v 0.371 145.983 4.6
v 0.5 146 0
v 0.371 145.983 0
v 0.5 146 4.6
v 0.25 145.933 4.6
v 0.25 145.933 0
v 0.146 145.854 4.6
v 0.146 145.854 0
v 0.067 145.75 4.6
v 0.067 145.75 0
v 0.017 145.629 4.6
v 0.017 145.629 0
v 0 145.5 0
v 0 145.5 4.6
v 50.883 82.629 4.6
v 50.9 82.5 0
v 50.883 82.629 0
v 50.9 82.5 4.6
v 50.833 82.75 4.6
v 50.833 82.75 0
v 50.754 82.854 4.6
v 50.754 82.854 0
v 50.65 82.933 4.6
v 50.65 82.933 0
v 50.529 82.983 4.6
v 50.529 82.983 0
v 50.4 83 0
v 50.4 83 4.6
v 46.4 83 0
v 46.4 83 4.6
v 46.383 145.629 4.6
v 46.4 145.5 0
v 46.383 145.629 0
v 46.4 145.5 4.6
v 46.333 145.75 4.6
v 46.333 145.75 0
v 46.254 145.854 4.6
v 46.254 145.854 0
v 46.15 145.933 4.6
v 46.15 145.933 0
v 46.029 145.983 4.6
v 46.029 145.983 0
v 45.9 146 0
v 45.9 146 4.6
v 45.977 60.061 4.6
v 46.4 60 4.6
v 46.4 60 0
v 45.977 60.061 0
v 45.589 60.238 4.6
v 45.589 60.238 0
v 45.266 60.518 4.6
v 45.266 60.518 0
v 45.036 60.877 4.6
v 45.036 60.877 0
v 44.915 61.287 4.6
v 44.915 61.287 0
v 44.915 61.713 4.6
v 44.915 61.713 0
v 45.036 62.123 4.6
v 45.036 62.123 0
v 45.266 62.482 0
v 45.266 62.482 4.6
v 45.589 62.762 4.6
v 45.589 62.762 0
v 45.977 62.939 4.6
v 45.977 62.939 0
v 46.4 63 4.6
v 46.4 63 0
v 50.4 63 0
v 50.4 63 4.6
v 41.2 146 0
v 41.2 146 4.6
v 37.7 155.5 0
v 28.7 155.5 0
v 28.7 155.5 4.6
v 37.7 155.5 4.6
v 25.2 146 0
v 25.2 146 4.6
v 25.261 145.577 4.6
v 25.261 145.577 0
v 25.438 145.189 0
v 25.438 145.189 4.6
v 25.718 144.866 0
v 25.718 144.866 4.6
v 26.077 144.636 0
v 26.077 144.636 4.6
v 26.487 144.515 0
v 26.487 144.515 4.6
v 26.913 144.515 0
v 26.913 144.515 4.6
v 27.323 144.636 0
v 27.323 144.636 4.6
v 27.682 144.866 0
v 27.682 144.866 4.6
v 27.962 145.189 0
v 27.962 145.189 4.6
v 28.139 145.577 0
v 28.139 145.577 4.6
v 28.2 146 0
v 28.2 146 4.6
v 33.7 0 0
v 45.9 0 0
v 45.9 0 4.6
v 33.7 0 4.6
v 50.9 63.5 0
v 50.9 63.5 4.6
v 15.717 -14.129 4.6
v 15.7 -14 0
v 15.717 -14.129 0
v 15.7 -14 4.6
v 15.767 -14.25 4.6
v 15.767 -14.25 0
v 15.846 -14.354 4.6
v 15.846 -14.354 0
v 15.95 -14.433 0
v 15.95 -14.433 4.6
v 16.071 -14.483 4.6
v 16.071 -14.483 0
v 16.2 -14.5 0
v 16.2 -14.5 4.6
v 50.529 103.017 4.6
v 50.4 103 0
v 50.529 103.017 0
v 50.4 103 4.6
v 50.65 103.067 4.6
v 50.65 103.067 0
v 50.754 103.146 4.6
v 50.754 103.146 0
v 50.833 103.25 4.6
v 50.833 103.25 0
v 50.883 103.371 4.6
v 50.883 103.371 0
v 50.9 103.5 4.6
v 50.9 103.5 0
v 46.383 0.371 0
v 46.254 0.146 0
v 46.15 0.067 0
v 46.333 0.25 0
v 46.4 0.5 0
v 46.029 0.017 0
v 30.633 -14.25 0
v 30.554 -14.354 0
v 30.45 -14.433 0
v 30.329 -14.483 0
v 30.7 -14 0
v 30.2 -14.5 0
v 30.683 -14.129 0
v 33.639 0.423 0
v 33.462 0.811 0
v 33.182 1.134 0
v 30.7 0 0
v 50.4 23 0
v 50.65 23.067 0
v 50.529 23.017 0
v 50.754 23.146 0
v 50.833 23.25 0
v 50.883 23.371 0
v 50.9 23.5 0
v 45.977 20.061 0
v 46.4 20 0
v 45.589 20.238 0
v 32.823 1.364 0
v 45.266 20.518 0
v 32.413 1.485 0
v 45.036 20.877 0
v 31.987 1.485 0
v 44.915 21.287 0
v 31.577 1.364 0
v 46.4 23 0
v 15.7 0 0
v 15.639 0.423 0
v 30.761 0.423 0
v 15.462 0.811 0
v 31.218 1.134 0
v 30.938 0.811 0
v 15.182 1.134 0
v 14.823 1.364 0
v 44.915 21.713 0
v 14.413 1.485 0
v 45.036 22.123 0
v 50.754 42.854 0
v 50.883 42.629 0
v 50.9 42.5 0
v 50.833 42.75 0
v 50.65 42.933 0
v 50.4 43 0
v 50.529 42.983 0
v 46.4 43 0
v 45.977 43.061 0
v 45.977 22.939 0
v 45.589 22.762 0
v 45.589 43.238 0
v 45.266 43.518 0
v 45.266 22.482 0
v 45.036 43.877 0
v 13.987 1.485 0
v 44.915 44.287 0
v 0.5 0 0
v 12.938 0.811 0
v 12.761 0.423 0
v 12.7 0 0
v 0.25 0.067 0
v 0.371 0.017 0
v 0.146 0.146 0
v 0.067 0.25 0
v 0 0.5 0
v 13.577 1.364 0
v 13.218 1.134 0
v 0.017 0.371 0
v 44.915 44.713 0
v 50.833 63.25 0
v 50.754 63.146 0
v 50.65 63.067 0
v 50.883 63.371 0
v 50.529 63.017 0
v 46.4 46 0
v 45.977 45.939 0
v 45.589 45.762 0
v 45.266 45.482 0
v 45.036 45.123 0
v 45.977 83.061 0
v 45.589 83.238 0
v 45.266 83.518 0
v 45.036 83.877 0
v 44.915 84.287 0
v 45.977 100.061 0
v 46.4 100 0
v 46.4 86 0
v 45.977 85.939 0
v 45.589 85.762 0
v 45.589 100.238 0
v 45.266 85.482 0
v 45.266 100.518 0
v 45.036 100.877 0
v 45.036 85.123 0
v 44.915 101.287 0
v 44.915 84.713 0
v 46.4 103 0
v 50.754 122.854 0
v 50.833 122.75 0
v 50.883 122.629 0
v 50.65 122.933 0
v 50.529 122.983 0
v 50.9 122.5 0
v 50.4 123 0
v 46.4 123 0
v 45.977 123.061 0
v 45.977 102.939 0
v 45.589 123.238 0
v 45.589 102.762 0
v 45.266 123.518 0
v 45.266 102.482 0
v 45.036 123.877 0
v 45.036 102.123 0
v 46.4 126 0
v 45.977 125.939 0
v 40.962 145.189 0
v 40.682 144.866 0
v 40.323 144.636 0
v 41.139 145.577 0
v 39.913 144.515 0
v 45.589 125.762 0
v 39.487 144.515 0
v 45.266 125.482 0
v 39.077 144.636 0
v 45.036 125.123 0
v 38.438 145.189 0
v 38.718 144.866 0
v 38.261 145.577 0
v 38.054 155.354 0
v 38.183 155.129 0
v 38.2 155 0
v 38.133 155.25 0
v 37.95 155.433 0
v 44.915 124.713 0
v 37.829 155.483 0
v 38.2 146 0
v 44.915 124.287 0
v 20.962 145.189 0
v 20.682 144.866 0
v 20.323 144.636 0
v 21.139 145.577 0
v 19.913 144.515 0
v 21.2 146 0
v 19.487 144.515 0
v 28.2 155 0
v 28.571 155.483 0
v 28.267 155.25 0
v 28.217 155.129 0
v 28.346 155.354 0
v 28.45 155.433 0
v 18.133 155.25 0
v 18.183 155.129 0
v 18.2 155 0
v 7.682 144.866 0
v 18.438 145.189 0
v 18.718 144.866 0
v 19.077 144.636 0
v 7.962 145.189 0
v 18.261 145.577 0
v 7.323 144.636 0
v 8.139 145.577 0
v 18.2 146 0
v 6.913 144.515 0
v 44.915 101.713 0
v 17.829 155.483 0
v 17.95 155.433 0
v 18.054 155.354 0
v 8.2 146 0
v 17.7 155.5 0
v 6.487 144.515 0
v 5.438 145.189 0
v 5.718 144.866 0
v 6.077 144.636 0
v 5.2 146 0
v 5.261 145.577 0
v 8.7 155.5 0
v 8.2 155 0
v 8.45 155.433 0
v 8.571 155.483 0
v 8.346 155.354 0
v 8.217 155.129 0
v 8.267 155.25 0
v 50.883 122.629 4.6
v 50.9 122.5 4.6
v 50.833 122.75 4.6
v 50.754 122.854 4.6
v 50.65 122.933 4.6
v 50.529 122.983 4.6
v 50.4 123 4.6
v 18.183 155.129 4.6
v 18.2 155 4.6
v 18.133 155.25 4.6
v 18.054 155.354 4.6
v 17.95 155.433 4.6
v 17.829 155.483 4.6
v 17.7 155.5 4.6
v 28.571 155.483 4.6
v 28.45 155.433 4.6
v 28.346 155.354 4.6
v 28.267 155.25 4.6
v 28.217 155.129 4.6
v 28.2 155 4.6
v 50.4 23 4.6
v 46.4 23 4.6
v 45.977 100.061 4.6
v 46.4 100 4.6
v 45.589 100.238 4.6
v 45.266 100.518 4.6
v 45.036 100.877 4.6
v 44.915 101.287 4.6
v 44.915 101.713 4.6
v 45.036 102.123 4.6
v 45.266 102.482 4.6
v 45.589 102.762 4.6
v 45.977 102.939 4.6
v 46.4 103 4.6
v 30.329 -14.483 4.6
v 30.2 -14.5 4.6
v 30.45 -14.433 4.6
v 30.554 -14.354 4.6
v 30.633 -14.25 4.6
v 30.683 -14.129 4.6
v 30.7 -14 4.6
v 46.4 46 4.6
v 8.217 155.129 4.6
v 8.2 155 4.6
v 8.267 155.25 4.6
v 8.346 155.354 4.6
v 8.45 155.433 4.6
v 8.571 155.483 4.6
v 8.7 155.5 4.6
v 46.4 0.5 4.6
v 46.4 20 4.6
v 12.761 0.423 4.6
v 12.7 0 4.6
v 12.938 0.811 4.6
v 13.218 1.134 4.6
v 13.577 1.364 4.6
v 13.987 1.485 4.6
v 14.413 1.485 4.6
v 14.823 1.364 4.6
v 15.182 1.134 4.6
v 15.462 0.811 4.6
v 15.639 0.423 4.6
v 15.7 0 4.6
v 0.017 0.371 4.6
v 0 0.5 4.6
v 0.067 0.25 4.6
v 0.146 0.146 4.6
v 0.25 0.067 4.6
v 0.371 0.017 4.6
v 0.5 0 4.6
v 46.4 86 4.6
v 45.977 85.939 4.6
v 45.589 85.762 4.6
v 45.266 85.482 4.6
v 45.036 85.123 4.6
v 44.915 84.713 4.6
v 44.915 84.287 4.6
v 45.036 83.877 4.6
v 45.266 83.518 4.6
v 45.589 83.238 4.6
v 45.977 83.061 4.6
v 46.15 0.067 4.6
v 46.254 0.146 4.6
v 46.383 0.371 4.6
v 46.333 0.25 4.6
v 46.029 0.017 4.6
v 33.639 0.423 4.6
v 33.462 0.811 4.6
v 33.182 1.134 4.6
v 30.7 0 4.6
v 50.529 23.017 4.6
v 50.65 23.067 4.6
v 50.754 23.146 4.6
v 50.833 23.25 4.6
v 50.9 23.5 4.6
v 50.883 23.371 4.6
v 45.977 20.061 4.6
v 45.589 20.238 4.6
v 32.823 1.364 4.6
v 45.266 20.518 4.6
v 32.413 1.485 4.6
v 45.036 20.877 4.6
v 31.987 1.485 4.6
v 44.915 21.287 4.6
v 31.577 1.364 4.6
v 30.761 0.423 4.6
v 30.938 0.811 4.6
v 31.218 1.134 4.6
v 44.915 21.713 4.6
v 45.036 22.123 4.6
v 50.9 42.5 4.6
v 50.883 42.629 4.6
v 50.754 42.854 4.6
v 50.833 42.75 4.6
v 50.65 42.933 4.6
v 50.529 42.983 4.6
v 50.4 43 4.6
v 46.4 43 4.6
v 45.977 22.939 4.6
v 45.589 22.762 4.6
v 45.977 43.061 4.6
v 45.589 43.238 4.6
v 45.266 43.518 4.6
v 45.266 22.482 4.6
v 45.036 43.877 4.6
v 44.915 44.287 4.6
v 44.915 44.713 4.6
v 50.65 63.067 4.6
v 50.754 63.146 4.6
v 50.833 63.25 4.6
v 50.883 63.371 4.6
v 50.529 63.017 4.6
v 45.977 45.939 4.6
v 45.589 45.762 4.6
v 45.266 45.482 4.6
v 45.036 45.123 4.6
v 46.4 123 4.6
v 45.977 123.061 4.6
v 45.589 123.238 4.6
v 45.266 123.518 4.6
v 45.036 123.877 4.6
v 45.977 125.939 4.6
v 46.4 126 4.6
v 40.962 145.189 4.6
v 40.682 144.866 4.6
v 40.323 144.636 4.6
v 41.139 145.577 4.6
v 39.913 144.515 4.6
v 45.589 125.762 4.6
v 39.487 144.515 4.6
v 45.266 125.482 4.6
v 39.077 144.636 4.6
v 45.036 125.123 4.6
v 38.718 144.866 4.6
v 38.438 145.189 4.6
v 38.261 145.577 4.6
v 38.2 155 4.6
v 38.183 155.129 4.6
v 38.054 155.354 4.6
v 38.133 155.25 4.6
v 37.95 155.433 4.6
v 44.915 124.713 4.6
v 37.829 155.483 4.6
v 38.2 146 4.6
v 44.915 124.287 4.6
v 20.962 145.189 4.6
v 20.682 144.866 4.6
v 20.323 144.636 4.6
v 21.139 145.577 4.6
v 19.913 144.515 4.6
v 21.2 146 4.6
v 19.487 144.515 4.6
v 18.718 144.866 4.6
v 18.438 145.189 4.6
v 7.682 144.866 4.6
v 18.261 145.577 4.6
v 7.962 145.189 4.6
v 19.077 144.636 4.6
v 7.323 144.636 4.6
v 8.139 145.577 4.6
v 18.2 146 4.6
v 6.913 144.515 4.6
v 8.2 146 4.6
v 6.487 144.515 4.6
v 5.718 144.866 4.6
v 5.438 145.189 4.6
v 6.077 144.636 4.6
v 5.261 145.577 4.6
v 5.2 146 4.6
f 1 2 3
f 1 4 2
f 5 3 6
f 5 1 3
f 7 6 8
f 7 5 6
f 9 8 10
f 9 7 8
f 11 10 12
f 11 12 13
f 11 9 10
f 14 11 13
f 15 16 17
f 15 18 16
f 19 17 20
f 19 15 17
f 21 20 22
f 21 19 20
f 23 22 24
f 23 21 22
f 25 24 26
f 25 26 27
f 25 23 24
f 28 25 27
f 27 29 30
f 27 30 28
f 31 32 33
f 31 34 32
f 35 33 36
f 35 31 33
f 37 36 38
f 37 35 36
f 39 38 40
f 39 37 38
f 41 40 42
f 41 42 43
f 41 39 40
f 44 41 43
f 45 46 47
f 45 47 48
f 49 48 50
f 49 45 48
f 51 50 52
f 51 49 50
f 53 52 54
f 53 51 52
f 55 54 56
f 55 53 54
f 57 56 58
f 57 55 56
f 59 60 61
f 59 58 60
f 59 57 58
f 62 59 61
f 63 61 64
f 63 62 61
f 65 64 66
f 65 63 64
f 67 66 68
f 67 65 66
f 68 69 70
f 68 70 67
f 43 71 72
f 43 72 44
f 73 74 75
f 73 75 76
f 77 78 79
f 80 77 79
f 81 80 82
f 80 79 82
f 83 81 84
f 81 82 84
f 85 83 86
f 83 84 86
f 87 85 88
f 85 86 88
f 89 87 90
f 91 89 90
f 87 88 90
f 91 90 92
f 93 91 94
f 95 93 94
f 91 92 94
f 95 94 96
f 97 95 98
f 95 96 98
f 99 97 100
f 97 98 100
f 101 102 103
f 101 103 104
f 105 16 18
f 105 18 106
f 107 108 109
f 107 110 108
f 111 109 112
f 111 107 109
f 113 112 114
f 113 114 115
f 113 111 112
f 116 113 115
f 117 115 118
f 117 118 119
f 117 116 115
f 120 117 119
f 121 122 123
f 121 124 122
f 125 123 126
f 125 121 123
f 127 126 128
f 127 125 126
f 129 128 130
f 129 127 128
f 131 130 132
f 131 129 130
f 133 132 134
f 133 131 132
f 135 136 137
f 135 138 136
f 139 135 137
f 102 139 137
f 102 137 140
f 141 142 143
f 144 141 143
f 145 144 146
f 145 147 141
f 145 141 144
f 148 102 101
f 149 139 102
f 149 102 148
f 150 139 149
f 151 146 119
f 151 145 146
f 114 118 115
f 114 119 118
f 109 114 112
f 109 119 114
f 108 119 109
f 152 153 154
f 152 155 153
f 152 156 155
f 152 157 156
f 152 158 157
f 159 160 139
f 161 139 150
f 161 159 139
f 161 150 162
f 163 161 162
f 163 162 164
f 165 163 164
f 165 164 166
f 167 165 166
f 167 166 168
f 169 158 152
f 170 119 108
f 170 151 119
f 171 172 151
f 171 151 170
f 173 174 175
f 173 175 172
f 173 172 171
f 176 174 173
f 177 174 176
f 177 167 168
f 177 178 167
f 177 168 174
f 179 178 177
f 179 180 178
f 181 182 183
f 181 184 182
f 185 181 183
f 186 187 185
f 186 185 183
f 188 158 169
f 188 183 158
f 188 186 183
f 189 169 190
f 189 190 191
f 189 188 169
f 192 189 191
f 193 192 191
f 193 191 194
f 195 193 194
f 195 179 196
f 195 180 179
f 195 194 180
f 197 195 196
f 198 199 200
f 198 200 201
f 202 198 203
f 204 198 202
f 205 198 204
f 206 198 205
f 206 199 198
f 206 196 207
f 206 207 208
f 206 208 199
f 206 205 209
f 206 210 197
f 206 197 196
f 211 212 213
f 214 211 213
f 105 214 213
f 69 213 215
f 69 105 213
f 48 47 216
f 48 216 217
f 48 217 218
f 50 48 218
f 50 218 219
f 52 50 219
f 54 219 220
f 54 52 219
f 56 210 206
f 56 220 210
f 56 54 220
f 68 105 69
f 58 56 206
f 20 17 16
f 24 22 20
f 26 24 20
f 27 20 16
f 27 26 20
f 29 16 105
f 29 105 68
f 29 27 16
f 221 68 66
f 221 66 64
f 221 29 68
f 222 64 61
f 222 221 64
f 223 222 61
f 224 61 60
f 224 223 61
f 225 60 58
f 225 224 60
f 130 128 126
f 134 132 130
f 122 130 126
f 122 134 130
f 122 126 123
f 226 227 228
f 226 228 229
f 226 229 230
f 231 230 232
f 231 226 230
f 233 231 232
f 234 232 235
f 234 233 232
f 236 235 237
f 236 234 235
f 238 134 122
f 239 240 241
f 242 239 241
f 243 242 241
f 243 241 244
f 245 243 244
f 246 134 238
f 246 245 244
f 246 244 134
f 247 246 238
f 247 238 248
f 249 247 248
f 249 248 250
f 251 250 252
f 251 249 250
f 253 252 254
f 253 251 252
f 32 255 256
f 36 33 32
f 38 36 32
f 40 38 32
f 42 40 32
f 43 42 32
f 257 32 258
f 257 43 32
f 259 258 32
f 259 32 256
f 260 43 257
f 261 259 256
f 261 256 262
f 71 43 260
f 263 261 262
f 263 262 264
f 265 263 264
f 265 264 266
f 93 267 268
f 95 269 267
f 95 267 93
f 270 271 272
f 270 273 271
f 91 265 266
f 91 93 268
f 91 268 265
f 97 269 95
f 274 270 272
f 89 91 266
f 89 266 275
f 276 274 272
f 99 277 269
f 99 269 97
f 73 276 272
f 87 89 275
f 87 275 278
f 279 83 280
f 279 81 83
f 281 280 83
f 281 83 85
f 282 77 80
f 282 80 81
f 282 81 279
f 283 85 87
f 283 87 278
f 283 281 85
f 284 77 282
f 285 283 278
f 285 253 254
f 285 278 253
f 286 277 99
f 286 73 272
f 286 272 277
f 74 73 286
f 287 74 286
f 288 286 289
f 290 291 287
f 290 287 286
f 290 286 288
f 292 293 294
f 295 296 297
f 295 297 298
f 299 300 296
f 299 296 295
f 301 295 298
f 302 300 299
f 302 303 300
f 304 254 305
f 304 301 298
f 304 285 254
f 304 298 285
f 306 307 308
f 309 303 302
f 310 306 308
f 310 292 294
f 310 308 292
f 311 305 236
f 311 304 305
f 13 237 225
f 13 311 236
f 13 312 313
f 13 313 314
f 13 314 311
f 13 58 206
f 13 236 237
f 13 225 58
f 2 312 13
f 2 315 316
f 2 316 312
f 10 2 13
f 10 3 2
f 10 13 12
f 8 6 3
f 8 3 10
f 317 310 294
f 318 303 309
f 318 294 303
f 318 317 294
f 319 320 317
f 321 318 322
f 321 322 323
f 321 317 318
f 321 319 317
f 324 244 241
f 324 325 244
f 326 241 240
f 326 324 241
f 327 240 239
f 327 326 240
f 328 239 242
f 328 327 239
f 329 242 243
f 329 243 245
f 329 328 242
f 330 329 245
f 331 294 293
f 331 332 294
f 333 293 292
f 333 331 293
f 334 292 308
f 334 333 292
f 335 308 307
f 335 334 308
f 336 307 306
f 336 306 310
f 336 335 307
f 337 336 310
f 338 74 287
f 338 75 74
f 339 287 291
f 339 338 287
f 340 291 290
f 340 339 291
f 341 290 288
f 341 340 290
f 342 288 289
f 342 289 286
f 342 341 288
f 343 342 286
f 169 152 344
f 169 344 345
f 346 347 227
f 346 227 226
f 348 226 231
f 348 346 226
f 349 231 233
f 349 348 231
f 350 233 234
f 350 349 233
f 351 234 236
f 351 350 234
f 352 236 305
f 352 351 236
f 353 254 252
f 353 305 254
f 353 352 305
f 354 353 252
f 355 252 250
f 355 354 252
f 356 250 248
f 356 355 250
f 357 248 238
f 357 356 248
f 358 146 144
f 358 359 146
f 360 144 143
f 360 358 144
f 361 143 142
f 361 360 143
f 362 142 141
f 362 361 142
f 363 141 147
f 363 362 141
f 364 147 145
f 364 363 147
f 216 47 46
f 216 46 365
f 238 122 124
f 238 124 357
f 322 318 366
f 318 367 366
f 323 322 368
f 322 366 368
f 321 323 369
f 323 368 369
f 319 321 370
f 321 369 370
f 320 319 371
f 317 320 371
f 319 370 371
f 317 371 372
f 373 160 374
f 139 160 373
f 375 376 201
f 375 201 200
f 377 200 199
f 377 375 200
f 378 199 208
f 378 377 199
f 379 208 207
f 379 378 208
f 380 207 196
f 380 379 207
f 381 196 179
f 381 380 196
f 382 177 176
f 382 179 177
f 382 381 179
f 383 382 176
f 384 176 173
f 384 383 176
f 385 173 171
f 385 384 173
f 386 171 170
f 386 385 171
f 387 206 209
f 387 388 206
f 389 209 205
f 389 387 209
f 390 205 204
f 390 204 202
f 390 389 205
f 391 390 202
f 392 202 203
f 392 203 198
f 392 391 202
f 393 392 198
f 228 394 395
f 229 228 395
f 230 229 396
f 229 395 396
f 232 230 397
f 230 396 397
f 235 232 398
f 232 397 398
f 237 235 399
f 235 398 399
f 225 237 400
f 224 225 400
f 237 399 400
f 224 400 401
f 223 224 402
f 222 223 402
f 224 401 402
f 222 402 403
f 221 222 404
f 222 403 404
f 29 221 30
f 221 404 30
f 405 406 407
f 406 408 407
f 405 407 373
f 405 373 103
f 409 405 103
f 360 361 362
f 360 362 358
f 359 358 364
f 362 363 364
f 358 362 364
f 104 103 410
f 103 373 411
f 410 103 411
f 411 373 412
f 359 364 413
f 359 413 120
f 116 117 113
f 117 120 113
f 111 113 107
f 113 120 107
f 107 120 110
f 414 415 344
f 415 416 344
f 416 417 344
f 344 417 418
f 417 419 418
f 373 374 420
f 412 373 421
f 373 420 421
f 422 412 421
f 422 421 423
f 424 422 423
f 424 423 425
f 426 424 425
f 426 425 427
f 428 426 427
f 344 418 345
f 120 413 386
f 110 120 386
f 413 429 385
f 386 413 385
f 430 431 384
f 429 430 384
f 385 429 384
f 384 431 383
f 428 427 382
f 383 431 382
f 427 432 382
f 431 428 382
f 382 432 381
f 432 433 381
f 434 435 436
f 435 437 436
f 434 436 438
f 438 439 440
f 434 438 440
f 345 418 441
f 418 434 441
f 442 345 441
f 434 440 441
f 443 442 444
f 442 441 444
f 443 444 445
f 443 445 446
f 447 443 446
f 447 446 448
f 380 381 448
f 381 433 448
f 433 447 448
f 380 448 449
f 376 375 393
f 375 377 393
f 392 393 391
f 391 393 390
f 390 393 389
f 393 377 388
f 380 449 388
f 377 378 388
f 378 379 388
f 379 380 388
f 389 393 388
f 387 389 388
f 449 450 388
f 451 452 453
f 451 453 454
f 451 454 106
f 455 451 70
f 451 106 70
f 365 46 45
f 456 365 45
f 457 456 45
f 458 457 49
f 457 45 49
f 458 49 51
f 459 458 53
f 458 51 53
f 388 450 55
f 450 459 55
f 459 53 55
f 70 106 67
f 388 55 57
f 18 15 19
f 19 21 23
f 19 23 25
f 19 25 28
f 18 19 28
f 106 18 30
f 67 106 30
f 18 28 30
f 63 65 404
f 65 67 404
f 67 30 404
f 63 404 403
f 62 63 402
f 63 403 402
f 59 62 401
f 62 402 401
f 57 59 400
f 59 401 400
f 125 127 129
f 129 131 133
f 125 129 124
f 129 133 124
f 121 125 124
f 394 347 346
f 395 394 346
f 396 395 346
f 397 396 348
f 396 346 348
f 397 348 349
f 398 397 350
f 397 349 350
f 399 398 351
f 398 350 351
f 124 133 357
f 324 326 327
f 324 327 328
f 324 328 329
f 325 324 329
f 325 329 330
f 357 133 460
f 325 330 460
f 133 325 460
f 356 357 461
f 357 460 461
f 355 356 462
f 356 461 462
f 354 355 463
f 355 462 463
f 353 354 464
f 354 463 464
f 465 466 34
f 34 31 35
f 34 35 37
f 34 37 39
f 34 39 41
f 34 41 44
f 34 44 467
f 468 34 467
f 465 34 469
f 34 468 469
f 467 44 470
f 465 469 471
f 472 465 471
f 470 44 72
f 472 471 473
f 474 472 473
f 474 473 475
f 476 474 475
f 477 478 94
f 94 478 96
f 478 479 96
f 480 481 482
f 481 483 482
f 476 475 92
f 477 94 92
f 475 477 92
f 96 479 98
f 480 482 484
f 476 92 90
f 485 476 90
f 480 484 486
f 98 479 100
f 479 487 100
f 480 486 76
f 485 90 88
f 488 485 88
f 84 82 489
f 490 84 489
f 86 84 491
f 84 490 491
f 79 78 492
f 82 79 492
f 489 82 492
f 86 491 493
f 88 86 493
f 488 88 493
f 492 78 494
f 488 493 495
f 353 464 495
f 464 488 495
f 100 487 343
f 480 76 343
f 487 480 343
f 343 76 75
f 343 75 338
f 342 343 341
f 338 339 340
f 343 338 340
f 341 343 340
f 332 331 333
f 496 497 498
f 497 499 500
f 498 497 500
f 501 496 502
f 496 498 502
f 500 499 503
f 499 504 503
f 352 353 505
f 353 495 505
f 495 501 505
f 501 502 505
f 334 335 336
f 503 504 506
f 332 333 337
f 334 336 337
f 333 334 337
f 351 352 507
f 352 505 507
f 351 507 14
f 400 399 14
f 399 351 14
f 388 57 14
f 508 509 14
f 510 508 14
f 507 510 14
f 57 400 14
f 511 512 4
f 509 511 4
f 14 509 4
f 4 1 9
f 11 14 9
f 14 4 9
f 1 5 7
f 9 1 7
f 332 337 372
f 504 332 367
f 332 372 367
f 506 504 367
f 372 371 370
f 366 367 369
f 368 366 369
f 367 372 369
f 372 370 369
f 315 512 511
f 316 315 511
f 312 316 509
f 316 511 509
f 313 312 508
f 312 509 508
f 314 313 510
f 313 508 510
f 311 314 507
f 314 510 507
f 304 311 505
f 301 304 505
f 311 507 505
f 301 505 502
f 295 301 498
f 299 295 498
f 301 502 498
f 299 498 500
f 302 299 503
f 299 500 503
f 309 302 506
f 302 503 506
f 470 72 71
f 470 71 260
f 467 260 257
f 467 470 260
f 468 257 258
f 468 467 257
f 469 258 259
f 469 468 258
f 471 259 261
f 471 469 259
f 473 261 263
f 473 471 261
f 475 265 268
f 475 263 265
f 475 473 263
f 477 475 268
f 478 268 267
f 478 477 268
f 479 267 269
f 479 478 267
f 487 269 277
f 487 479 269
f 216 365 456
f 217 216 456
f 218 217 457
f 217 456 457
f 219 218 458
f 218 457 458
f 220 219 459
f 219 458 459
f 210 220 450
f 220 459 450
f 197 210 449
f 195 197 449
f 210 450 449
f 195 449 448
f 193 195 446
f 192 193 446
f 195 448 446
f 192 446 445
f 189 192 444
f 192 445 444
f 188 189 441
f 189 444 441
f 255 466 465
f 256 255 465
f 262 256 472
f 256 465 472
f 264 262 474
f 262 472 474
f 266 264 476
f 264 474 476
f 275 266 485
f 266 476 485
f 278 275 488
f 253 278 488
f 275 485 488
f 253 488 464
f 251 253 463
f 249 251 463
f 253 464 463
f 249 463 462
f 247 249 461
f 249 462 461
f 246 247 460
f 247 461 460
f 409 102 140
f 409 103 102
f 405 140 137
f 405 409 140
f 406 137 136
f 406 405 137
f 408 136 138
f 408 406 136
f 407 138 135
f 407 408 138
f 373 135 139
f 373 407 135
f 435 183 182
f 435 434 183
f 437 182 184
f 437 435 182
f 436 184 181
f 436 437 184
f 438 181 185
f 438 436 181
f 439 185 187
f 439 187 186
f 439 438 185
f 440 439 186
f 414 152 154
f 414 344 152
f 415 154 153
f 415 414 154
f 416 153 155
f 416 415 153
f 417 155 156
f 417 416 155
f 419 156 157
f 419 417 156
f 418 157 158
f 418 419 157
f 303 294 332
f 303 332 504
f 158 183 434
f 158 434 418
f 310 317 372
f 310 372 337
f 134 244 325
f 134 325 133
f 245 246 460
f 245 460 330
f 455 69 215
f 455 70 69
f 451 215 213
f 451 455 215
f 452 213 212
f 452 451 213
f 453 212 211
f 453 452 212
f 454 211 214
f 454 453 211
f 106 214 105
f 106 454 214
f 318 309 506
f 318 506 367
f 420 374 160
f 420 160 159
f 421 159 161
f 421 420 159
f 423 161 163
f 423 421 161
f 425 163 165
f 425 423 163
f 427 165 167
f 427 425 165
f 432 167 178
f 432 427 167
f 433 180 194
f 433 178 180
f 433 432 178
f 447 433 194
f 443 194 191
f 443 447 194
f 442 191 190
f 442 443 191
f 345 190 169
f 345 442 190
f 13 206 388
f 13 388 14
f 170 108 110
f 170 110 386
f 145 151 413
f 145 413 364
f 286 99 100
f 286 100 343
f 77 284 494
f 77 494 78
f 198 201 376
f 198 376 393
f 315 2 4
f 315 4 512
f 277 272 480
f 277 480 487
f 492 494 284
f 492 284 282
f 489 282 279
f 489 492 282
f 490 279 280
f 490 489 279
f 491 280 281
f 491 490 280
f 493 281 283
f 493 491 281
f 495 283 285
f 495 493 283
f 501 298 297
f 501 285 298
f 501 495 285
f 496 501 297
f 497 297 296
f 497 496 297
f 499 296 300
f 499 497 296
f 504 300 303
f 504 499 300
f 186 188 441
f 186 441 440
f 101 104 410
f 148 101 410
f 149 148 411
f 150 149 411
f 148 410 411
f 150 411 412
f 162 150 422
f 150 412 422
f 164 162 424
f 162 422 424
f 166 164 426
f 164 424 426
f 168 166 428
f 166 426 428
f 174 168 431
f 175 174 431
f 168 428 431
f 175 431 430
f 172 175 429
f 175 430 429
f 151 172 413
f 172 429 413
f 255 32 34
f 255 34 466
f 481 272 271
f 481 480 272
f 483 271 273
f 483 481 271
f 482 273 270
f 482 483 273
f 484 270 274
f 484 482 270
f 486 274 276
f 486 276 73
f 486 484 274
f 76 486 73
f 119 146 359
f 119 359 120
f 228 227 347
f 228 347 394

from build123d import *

# Parameters (mm, degrees)
BOSS_EXTRUDE1_DEPTH = 4.6
CUT_EXTRUDE1_DEPTH  = 164.683291756
FILLET1_R           = 0.5


with BuildPart() as part:
    # Sketch1 → Boss-Extrude1 (new body)
    with BuildSketch(Plane.XY):
        Polygon((8.2, 146), (8.2, 155.5), (18.2, 155.5), (18.2, 146), (28.2, 146), (28.2, 155.5), (38.2, 155.5), (38.2, 146), (46.4, 146), (46.4, 123), (50.9, 123), (50.9, 103), (46.4, 103), (46.4, 83), (50.9, 83), (50.9, 63), (46.4, 63), (46.4, 43), (50.9, 43), (50.9, 23), (46.4, 23), (46.4, 0), (30.7, 0), (30.7, -14.5), (15.7, -14.5), (15.7, 0), (0, 0), (0, 146), align=None)
    extrude(amount=BOSS_EXTRUDE1_DEPTH)

    # Sketch2 → Cut-Extrude1 (cut, through all)
    with BuildSketch(Plane.XY.offset(4.6)):
        with BuildLine():
            Line((15.7, 0), (15.7, -5))
            ThreePointArc((15.7, -5), (14.2, -6.5), (12.7, -5))
            Line((12.7, -5), (12.7, 0))
            ThreePointArc((12.7, 0), (14.2, 1.5), (15.7, 0))
        make_face()
        with BuildLine():
            Line((30.7, 0), (30.7, -5))
            ThreePointArc((30.7, -5), (32.2, -6.5), (33.7, -5))
            Line((33.7, -5), (33.7, 0))
            ThreePointArc((33.7, 0), (32.2, 1.5), (30.7, 0))
        make_face()
        with BuildLine():
            Line((46.4, 23), (50.9, 23))
            ThreePointArc((50.9, 23), (52.4, 21.5), (50.9, 20))
            Line((50.9, 20), (46.4, 20))
            ThreePointArc((46.4, 20), (44.9, 21.5), (46.4, 23))
        make_face()
        with BuildLine():
            Line((46.4, 63), (50.9, 63))
            ThreePointArc((50.9, 63), (52.4, 61.5), (50.9, 60))
            Line((50.9, 60), (46.4, 60))
            ThreePointArc((46.4, 60), (44.9, 61.5), (46.4, 63))
        make_face()
        with BuildLine():
            Line((46.4, 103), (50.9, 103))
            ThreePointArc((50.9, 103), (52.4, 101.5), (50.9, 100))
            Line((50.9, 100), (46.4, 100))
            ThreePointArc((46.4, 100), (44.9, 101.5), (46.4, 103))
        make_face()
        with BuildLine():
            Line((46.4, 43), (50.9, 43))
            ThreePointArc((50.9, 43), (52.4, 44.5), (50.9, 46))
            Line((50.9, 46), (46.4, 46))
            ThreePointArc((46.4, 46), (44.9, 44.5), (46.4, 43))
        make_face()
        with BuildLine():
            Line((46.4, 83), (50.9, 83))
            ThreePointArc((50.9, 83), (52.4, 84.5), (50.9, 86))
            Line((50.9, 86), (46.4, 86))
            ThreePointArc((46.4, 86), (44.9, 84.5), (46.4, 83))
        make_face()
        with BuildLine():
            Line((46.4, 123), (50.9, 123))
            ThreePointArc((50.9, 123), (52.4, 124.5), (50.9, 126))
            Line((50.9, 126), (46.4, 126))
            ThreePointArc((46.4, 126), (44.9, 124.5), (46.4, 123))
        make_face()
        with BuildLine():
            Line((38.2, 146), (38.2, 155.5))
            ThreePointArc((38.2, 155.5), (39.7, 157), (41.2, 155.5))
            Line((41.2, 155.5), (41.2, 146))
            ThreePointArc((41.2, 146), (39.7, 144.5), (38.2, 146))
        make_face()
        with BuildLine():
            Line((28.2, 146), (28.2, 155.5))
            ThreePointArc((28.2, 155.5), (26.7, 157), (25.2, 155.5))
            Line((25.2, 155.5), (25.2, 146))
            ThreePointArc((25.2, 146), (26.7, 144.5), (28.2, 146))
        make_face()
        with BuildLine():
            Line((8.2, 146), (8.2, 155.5))
            ThreePointArc((8.2, 155.5), (6.7, 157), (5.2, 155.5))
            Line((5.2, 155.5), (5.2, 146))
            ThreePointArc((5.2, 146), (6.7, 144.5), (8.2, 146))
        make_face()
        with BuildLine():
            Line((18.2, 146), (18.2, 155.5))
            ThreePointArc((18.2, 155.5), (19.7, 157), (21.2, 155.5))
            Line((21.2, 155.5), (21.2, 146))
            ThreePointArc((21.2, 146), (19.7, 144.5), (18.2, 146))
        make_face()
    extrude(amount=-CUT_EXTRUDE1_DEPTH, mode=Mode.SUBTRACT)

    # Fillet1
    fillet1_edges = [part.edges().sort_by_distance(p)[0] for p in [
        (0, 146, 2.3),
        (8.2, 155.5, 2.3),
        (18.2, 155.5, 2.3),
        (28.2, 155.5, 2.3),
        (38.2, 155.5, 2.3),
        (46.4, 146, 2.3),
        (50.9, 123, 2.3),
        (50.9, 103, 2.3),
        (50.9, 83, 2.3),
        (50.9, 63, 2.3),
        (50.9, 43, 2.3),
        (50.9, 23, 2.3),
        (46.4, 0, 2.3),
        (30.7, -14.5, 2.3),
        (15.7, -14.5, 2.3),
        (0, 0, 2.3),
    ]]
    fillet(fillet1_edges, radius=FILLET1_R)


solid = part.part
